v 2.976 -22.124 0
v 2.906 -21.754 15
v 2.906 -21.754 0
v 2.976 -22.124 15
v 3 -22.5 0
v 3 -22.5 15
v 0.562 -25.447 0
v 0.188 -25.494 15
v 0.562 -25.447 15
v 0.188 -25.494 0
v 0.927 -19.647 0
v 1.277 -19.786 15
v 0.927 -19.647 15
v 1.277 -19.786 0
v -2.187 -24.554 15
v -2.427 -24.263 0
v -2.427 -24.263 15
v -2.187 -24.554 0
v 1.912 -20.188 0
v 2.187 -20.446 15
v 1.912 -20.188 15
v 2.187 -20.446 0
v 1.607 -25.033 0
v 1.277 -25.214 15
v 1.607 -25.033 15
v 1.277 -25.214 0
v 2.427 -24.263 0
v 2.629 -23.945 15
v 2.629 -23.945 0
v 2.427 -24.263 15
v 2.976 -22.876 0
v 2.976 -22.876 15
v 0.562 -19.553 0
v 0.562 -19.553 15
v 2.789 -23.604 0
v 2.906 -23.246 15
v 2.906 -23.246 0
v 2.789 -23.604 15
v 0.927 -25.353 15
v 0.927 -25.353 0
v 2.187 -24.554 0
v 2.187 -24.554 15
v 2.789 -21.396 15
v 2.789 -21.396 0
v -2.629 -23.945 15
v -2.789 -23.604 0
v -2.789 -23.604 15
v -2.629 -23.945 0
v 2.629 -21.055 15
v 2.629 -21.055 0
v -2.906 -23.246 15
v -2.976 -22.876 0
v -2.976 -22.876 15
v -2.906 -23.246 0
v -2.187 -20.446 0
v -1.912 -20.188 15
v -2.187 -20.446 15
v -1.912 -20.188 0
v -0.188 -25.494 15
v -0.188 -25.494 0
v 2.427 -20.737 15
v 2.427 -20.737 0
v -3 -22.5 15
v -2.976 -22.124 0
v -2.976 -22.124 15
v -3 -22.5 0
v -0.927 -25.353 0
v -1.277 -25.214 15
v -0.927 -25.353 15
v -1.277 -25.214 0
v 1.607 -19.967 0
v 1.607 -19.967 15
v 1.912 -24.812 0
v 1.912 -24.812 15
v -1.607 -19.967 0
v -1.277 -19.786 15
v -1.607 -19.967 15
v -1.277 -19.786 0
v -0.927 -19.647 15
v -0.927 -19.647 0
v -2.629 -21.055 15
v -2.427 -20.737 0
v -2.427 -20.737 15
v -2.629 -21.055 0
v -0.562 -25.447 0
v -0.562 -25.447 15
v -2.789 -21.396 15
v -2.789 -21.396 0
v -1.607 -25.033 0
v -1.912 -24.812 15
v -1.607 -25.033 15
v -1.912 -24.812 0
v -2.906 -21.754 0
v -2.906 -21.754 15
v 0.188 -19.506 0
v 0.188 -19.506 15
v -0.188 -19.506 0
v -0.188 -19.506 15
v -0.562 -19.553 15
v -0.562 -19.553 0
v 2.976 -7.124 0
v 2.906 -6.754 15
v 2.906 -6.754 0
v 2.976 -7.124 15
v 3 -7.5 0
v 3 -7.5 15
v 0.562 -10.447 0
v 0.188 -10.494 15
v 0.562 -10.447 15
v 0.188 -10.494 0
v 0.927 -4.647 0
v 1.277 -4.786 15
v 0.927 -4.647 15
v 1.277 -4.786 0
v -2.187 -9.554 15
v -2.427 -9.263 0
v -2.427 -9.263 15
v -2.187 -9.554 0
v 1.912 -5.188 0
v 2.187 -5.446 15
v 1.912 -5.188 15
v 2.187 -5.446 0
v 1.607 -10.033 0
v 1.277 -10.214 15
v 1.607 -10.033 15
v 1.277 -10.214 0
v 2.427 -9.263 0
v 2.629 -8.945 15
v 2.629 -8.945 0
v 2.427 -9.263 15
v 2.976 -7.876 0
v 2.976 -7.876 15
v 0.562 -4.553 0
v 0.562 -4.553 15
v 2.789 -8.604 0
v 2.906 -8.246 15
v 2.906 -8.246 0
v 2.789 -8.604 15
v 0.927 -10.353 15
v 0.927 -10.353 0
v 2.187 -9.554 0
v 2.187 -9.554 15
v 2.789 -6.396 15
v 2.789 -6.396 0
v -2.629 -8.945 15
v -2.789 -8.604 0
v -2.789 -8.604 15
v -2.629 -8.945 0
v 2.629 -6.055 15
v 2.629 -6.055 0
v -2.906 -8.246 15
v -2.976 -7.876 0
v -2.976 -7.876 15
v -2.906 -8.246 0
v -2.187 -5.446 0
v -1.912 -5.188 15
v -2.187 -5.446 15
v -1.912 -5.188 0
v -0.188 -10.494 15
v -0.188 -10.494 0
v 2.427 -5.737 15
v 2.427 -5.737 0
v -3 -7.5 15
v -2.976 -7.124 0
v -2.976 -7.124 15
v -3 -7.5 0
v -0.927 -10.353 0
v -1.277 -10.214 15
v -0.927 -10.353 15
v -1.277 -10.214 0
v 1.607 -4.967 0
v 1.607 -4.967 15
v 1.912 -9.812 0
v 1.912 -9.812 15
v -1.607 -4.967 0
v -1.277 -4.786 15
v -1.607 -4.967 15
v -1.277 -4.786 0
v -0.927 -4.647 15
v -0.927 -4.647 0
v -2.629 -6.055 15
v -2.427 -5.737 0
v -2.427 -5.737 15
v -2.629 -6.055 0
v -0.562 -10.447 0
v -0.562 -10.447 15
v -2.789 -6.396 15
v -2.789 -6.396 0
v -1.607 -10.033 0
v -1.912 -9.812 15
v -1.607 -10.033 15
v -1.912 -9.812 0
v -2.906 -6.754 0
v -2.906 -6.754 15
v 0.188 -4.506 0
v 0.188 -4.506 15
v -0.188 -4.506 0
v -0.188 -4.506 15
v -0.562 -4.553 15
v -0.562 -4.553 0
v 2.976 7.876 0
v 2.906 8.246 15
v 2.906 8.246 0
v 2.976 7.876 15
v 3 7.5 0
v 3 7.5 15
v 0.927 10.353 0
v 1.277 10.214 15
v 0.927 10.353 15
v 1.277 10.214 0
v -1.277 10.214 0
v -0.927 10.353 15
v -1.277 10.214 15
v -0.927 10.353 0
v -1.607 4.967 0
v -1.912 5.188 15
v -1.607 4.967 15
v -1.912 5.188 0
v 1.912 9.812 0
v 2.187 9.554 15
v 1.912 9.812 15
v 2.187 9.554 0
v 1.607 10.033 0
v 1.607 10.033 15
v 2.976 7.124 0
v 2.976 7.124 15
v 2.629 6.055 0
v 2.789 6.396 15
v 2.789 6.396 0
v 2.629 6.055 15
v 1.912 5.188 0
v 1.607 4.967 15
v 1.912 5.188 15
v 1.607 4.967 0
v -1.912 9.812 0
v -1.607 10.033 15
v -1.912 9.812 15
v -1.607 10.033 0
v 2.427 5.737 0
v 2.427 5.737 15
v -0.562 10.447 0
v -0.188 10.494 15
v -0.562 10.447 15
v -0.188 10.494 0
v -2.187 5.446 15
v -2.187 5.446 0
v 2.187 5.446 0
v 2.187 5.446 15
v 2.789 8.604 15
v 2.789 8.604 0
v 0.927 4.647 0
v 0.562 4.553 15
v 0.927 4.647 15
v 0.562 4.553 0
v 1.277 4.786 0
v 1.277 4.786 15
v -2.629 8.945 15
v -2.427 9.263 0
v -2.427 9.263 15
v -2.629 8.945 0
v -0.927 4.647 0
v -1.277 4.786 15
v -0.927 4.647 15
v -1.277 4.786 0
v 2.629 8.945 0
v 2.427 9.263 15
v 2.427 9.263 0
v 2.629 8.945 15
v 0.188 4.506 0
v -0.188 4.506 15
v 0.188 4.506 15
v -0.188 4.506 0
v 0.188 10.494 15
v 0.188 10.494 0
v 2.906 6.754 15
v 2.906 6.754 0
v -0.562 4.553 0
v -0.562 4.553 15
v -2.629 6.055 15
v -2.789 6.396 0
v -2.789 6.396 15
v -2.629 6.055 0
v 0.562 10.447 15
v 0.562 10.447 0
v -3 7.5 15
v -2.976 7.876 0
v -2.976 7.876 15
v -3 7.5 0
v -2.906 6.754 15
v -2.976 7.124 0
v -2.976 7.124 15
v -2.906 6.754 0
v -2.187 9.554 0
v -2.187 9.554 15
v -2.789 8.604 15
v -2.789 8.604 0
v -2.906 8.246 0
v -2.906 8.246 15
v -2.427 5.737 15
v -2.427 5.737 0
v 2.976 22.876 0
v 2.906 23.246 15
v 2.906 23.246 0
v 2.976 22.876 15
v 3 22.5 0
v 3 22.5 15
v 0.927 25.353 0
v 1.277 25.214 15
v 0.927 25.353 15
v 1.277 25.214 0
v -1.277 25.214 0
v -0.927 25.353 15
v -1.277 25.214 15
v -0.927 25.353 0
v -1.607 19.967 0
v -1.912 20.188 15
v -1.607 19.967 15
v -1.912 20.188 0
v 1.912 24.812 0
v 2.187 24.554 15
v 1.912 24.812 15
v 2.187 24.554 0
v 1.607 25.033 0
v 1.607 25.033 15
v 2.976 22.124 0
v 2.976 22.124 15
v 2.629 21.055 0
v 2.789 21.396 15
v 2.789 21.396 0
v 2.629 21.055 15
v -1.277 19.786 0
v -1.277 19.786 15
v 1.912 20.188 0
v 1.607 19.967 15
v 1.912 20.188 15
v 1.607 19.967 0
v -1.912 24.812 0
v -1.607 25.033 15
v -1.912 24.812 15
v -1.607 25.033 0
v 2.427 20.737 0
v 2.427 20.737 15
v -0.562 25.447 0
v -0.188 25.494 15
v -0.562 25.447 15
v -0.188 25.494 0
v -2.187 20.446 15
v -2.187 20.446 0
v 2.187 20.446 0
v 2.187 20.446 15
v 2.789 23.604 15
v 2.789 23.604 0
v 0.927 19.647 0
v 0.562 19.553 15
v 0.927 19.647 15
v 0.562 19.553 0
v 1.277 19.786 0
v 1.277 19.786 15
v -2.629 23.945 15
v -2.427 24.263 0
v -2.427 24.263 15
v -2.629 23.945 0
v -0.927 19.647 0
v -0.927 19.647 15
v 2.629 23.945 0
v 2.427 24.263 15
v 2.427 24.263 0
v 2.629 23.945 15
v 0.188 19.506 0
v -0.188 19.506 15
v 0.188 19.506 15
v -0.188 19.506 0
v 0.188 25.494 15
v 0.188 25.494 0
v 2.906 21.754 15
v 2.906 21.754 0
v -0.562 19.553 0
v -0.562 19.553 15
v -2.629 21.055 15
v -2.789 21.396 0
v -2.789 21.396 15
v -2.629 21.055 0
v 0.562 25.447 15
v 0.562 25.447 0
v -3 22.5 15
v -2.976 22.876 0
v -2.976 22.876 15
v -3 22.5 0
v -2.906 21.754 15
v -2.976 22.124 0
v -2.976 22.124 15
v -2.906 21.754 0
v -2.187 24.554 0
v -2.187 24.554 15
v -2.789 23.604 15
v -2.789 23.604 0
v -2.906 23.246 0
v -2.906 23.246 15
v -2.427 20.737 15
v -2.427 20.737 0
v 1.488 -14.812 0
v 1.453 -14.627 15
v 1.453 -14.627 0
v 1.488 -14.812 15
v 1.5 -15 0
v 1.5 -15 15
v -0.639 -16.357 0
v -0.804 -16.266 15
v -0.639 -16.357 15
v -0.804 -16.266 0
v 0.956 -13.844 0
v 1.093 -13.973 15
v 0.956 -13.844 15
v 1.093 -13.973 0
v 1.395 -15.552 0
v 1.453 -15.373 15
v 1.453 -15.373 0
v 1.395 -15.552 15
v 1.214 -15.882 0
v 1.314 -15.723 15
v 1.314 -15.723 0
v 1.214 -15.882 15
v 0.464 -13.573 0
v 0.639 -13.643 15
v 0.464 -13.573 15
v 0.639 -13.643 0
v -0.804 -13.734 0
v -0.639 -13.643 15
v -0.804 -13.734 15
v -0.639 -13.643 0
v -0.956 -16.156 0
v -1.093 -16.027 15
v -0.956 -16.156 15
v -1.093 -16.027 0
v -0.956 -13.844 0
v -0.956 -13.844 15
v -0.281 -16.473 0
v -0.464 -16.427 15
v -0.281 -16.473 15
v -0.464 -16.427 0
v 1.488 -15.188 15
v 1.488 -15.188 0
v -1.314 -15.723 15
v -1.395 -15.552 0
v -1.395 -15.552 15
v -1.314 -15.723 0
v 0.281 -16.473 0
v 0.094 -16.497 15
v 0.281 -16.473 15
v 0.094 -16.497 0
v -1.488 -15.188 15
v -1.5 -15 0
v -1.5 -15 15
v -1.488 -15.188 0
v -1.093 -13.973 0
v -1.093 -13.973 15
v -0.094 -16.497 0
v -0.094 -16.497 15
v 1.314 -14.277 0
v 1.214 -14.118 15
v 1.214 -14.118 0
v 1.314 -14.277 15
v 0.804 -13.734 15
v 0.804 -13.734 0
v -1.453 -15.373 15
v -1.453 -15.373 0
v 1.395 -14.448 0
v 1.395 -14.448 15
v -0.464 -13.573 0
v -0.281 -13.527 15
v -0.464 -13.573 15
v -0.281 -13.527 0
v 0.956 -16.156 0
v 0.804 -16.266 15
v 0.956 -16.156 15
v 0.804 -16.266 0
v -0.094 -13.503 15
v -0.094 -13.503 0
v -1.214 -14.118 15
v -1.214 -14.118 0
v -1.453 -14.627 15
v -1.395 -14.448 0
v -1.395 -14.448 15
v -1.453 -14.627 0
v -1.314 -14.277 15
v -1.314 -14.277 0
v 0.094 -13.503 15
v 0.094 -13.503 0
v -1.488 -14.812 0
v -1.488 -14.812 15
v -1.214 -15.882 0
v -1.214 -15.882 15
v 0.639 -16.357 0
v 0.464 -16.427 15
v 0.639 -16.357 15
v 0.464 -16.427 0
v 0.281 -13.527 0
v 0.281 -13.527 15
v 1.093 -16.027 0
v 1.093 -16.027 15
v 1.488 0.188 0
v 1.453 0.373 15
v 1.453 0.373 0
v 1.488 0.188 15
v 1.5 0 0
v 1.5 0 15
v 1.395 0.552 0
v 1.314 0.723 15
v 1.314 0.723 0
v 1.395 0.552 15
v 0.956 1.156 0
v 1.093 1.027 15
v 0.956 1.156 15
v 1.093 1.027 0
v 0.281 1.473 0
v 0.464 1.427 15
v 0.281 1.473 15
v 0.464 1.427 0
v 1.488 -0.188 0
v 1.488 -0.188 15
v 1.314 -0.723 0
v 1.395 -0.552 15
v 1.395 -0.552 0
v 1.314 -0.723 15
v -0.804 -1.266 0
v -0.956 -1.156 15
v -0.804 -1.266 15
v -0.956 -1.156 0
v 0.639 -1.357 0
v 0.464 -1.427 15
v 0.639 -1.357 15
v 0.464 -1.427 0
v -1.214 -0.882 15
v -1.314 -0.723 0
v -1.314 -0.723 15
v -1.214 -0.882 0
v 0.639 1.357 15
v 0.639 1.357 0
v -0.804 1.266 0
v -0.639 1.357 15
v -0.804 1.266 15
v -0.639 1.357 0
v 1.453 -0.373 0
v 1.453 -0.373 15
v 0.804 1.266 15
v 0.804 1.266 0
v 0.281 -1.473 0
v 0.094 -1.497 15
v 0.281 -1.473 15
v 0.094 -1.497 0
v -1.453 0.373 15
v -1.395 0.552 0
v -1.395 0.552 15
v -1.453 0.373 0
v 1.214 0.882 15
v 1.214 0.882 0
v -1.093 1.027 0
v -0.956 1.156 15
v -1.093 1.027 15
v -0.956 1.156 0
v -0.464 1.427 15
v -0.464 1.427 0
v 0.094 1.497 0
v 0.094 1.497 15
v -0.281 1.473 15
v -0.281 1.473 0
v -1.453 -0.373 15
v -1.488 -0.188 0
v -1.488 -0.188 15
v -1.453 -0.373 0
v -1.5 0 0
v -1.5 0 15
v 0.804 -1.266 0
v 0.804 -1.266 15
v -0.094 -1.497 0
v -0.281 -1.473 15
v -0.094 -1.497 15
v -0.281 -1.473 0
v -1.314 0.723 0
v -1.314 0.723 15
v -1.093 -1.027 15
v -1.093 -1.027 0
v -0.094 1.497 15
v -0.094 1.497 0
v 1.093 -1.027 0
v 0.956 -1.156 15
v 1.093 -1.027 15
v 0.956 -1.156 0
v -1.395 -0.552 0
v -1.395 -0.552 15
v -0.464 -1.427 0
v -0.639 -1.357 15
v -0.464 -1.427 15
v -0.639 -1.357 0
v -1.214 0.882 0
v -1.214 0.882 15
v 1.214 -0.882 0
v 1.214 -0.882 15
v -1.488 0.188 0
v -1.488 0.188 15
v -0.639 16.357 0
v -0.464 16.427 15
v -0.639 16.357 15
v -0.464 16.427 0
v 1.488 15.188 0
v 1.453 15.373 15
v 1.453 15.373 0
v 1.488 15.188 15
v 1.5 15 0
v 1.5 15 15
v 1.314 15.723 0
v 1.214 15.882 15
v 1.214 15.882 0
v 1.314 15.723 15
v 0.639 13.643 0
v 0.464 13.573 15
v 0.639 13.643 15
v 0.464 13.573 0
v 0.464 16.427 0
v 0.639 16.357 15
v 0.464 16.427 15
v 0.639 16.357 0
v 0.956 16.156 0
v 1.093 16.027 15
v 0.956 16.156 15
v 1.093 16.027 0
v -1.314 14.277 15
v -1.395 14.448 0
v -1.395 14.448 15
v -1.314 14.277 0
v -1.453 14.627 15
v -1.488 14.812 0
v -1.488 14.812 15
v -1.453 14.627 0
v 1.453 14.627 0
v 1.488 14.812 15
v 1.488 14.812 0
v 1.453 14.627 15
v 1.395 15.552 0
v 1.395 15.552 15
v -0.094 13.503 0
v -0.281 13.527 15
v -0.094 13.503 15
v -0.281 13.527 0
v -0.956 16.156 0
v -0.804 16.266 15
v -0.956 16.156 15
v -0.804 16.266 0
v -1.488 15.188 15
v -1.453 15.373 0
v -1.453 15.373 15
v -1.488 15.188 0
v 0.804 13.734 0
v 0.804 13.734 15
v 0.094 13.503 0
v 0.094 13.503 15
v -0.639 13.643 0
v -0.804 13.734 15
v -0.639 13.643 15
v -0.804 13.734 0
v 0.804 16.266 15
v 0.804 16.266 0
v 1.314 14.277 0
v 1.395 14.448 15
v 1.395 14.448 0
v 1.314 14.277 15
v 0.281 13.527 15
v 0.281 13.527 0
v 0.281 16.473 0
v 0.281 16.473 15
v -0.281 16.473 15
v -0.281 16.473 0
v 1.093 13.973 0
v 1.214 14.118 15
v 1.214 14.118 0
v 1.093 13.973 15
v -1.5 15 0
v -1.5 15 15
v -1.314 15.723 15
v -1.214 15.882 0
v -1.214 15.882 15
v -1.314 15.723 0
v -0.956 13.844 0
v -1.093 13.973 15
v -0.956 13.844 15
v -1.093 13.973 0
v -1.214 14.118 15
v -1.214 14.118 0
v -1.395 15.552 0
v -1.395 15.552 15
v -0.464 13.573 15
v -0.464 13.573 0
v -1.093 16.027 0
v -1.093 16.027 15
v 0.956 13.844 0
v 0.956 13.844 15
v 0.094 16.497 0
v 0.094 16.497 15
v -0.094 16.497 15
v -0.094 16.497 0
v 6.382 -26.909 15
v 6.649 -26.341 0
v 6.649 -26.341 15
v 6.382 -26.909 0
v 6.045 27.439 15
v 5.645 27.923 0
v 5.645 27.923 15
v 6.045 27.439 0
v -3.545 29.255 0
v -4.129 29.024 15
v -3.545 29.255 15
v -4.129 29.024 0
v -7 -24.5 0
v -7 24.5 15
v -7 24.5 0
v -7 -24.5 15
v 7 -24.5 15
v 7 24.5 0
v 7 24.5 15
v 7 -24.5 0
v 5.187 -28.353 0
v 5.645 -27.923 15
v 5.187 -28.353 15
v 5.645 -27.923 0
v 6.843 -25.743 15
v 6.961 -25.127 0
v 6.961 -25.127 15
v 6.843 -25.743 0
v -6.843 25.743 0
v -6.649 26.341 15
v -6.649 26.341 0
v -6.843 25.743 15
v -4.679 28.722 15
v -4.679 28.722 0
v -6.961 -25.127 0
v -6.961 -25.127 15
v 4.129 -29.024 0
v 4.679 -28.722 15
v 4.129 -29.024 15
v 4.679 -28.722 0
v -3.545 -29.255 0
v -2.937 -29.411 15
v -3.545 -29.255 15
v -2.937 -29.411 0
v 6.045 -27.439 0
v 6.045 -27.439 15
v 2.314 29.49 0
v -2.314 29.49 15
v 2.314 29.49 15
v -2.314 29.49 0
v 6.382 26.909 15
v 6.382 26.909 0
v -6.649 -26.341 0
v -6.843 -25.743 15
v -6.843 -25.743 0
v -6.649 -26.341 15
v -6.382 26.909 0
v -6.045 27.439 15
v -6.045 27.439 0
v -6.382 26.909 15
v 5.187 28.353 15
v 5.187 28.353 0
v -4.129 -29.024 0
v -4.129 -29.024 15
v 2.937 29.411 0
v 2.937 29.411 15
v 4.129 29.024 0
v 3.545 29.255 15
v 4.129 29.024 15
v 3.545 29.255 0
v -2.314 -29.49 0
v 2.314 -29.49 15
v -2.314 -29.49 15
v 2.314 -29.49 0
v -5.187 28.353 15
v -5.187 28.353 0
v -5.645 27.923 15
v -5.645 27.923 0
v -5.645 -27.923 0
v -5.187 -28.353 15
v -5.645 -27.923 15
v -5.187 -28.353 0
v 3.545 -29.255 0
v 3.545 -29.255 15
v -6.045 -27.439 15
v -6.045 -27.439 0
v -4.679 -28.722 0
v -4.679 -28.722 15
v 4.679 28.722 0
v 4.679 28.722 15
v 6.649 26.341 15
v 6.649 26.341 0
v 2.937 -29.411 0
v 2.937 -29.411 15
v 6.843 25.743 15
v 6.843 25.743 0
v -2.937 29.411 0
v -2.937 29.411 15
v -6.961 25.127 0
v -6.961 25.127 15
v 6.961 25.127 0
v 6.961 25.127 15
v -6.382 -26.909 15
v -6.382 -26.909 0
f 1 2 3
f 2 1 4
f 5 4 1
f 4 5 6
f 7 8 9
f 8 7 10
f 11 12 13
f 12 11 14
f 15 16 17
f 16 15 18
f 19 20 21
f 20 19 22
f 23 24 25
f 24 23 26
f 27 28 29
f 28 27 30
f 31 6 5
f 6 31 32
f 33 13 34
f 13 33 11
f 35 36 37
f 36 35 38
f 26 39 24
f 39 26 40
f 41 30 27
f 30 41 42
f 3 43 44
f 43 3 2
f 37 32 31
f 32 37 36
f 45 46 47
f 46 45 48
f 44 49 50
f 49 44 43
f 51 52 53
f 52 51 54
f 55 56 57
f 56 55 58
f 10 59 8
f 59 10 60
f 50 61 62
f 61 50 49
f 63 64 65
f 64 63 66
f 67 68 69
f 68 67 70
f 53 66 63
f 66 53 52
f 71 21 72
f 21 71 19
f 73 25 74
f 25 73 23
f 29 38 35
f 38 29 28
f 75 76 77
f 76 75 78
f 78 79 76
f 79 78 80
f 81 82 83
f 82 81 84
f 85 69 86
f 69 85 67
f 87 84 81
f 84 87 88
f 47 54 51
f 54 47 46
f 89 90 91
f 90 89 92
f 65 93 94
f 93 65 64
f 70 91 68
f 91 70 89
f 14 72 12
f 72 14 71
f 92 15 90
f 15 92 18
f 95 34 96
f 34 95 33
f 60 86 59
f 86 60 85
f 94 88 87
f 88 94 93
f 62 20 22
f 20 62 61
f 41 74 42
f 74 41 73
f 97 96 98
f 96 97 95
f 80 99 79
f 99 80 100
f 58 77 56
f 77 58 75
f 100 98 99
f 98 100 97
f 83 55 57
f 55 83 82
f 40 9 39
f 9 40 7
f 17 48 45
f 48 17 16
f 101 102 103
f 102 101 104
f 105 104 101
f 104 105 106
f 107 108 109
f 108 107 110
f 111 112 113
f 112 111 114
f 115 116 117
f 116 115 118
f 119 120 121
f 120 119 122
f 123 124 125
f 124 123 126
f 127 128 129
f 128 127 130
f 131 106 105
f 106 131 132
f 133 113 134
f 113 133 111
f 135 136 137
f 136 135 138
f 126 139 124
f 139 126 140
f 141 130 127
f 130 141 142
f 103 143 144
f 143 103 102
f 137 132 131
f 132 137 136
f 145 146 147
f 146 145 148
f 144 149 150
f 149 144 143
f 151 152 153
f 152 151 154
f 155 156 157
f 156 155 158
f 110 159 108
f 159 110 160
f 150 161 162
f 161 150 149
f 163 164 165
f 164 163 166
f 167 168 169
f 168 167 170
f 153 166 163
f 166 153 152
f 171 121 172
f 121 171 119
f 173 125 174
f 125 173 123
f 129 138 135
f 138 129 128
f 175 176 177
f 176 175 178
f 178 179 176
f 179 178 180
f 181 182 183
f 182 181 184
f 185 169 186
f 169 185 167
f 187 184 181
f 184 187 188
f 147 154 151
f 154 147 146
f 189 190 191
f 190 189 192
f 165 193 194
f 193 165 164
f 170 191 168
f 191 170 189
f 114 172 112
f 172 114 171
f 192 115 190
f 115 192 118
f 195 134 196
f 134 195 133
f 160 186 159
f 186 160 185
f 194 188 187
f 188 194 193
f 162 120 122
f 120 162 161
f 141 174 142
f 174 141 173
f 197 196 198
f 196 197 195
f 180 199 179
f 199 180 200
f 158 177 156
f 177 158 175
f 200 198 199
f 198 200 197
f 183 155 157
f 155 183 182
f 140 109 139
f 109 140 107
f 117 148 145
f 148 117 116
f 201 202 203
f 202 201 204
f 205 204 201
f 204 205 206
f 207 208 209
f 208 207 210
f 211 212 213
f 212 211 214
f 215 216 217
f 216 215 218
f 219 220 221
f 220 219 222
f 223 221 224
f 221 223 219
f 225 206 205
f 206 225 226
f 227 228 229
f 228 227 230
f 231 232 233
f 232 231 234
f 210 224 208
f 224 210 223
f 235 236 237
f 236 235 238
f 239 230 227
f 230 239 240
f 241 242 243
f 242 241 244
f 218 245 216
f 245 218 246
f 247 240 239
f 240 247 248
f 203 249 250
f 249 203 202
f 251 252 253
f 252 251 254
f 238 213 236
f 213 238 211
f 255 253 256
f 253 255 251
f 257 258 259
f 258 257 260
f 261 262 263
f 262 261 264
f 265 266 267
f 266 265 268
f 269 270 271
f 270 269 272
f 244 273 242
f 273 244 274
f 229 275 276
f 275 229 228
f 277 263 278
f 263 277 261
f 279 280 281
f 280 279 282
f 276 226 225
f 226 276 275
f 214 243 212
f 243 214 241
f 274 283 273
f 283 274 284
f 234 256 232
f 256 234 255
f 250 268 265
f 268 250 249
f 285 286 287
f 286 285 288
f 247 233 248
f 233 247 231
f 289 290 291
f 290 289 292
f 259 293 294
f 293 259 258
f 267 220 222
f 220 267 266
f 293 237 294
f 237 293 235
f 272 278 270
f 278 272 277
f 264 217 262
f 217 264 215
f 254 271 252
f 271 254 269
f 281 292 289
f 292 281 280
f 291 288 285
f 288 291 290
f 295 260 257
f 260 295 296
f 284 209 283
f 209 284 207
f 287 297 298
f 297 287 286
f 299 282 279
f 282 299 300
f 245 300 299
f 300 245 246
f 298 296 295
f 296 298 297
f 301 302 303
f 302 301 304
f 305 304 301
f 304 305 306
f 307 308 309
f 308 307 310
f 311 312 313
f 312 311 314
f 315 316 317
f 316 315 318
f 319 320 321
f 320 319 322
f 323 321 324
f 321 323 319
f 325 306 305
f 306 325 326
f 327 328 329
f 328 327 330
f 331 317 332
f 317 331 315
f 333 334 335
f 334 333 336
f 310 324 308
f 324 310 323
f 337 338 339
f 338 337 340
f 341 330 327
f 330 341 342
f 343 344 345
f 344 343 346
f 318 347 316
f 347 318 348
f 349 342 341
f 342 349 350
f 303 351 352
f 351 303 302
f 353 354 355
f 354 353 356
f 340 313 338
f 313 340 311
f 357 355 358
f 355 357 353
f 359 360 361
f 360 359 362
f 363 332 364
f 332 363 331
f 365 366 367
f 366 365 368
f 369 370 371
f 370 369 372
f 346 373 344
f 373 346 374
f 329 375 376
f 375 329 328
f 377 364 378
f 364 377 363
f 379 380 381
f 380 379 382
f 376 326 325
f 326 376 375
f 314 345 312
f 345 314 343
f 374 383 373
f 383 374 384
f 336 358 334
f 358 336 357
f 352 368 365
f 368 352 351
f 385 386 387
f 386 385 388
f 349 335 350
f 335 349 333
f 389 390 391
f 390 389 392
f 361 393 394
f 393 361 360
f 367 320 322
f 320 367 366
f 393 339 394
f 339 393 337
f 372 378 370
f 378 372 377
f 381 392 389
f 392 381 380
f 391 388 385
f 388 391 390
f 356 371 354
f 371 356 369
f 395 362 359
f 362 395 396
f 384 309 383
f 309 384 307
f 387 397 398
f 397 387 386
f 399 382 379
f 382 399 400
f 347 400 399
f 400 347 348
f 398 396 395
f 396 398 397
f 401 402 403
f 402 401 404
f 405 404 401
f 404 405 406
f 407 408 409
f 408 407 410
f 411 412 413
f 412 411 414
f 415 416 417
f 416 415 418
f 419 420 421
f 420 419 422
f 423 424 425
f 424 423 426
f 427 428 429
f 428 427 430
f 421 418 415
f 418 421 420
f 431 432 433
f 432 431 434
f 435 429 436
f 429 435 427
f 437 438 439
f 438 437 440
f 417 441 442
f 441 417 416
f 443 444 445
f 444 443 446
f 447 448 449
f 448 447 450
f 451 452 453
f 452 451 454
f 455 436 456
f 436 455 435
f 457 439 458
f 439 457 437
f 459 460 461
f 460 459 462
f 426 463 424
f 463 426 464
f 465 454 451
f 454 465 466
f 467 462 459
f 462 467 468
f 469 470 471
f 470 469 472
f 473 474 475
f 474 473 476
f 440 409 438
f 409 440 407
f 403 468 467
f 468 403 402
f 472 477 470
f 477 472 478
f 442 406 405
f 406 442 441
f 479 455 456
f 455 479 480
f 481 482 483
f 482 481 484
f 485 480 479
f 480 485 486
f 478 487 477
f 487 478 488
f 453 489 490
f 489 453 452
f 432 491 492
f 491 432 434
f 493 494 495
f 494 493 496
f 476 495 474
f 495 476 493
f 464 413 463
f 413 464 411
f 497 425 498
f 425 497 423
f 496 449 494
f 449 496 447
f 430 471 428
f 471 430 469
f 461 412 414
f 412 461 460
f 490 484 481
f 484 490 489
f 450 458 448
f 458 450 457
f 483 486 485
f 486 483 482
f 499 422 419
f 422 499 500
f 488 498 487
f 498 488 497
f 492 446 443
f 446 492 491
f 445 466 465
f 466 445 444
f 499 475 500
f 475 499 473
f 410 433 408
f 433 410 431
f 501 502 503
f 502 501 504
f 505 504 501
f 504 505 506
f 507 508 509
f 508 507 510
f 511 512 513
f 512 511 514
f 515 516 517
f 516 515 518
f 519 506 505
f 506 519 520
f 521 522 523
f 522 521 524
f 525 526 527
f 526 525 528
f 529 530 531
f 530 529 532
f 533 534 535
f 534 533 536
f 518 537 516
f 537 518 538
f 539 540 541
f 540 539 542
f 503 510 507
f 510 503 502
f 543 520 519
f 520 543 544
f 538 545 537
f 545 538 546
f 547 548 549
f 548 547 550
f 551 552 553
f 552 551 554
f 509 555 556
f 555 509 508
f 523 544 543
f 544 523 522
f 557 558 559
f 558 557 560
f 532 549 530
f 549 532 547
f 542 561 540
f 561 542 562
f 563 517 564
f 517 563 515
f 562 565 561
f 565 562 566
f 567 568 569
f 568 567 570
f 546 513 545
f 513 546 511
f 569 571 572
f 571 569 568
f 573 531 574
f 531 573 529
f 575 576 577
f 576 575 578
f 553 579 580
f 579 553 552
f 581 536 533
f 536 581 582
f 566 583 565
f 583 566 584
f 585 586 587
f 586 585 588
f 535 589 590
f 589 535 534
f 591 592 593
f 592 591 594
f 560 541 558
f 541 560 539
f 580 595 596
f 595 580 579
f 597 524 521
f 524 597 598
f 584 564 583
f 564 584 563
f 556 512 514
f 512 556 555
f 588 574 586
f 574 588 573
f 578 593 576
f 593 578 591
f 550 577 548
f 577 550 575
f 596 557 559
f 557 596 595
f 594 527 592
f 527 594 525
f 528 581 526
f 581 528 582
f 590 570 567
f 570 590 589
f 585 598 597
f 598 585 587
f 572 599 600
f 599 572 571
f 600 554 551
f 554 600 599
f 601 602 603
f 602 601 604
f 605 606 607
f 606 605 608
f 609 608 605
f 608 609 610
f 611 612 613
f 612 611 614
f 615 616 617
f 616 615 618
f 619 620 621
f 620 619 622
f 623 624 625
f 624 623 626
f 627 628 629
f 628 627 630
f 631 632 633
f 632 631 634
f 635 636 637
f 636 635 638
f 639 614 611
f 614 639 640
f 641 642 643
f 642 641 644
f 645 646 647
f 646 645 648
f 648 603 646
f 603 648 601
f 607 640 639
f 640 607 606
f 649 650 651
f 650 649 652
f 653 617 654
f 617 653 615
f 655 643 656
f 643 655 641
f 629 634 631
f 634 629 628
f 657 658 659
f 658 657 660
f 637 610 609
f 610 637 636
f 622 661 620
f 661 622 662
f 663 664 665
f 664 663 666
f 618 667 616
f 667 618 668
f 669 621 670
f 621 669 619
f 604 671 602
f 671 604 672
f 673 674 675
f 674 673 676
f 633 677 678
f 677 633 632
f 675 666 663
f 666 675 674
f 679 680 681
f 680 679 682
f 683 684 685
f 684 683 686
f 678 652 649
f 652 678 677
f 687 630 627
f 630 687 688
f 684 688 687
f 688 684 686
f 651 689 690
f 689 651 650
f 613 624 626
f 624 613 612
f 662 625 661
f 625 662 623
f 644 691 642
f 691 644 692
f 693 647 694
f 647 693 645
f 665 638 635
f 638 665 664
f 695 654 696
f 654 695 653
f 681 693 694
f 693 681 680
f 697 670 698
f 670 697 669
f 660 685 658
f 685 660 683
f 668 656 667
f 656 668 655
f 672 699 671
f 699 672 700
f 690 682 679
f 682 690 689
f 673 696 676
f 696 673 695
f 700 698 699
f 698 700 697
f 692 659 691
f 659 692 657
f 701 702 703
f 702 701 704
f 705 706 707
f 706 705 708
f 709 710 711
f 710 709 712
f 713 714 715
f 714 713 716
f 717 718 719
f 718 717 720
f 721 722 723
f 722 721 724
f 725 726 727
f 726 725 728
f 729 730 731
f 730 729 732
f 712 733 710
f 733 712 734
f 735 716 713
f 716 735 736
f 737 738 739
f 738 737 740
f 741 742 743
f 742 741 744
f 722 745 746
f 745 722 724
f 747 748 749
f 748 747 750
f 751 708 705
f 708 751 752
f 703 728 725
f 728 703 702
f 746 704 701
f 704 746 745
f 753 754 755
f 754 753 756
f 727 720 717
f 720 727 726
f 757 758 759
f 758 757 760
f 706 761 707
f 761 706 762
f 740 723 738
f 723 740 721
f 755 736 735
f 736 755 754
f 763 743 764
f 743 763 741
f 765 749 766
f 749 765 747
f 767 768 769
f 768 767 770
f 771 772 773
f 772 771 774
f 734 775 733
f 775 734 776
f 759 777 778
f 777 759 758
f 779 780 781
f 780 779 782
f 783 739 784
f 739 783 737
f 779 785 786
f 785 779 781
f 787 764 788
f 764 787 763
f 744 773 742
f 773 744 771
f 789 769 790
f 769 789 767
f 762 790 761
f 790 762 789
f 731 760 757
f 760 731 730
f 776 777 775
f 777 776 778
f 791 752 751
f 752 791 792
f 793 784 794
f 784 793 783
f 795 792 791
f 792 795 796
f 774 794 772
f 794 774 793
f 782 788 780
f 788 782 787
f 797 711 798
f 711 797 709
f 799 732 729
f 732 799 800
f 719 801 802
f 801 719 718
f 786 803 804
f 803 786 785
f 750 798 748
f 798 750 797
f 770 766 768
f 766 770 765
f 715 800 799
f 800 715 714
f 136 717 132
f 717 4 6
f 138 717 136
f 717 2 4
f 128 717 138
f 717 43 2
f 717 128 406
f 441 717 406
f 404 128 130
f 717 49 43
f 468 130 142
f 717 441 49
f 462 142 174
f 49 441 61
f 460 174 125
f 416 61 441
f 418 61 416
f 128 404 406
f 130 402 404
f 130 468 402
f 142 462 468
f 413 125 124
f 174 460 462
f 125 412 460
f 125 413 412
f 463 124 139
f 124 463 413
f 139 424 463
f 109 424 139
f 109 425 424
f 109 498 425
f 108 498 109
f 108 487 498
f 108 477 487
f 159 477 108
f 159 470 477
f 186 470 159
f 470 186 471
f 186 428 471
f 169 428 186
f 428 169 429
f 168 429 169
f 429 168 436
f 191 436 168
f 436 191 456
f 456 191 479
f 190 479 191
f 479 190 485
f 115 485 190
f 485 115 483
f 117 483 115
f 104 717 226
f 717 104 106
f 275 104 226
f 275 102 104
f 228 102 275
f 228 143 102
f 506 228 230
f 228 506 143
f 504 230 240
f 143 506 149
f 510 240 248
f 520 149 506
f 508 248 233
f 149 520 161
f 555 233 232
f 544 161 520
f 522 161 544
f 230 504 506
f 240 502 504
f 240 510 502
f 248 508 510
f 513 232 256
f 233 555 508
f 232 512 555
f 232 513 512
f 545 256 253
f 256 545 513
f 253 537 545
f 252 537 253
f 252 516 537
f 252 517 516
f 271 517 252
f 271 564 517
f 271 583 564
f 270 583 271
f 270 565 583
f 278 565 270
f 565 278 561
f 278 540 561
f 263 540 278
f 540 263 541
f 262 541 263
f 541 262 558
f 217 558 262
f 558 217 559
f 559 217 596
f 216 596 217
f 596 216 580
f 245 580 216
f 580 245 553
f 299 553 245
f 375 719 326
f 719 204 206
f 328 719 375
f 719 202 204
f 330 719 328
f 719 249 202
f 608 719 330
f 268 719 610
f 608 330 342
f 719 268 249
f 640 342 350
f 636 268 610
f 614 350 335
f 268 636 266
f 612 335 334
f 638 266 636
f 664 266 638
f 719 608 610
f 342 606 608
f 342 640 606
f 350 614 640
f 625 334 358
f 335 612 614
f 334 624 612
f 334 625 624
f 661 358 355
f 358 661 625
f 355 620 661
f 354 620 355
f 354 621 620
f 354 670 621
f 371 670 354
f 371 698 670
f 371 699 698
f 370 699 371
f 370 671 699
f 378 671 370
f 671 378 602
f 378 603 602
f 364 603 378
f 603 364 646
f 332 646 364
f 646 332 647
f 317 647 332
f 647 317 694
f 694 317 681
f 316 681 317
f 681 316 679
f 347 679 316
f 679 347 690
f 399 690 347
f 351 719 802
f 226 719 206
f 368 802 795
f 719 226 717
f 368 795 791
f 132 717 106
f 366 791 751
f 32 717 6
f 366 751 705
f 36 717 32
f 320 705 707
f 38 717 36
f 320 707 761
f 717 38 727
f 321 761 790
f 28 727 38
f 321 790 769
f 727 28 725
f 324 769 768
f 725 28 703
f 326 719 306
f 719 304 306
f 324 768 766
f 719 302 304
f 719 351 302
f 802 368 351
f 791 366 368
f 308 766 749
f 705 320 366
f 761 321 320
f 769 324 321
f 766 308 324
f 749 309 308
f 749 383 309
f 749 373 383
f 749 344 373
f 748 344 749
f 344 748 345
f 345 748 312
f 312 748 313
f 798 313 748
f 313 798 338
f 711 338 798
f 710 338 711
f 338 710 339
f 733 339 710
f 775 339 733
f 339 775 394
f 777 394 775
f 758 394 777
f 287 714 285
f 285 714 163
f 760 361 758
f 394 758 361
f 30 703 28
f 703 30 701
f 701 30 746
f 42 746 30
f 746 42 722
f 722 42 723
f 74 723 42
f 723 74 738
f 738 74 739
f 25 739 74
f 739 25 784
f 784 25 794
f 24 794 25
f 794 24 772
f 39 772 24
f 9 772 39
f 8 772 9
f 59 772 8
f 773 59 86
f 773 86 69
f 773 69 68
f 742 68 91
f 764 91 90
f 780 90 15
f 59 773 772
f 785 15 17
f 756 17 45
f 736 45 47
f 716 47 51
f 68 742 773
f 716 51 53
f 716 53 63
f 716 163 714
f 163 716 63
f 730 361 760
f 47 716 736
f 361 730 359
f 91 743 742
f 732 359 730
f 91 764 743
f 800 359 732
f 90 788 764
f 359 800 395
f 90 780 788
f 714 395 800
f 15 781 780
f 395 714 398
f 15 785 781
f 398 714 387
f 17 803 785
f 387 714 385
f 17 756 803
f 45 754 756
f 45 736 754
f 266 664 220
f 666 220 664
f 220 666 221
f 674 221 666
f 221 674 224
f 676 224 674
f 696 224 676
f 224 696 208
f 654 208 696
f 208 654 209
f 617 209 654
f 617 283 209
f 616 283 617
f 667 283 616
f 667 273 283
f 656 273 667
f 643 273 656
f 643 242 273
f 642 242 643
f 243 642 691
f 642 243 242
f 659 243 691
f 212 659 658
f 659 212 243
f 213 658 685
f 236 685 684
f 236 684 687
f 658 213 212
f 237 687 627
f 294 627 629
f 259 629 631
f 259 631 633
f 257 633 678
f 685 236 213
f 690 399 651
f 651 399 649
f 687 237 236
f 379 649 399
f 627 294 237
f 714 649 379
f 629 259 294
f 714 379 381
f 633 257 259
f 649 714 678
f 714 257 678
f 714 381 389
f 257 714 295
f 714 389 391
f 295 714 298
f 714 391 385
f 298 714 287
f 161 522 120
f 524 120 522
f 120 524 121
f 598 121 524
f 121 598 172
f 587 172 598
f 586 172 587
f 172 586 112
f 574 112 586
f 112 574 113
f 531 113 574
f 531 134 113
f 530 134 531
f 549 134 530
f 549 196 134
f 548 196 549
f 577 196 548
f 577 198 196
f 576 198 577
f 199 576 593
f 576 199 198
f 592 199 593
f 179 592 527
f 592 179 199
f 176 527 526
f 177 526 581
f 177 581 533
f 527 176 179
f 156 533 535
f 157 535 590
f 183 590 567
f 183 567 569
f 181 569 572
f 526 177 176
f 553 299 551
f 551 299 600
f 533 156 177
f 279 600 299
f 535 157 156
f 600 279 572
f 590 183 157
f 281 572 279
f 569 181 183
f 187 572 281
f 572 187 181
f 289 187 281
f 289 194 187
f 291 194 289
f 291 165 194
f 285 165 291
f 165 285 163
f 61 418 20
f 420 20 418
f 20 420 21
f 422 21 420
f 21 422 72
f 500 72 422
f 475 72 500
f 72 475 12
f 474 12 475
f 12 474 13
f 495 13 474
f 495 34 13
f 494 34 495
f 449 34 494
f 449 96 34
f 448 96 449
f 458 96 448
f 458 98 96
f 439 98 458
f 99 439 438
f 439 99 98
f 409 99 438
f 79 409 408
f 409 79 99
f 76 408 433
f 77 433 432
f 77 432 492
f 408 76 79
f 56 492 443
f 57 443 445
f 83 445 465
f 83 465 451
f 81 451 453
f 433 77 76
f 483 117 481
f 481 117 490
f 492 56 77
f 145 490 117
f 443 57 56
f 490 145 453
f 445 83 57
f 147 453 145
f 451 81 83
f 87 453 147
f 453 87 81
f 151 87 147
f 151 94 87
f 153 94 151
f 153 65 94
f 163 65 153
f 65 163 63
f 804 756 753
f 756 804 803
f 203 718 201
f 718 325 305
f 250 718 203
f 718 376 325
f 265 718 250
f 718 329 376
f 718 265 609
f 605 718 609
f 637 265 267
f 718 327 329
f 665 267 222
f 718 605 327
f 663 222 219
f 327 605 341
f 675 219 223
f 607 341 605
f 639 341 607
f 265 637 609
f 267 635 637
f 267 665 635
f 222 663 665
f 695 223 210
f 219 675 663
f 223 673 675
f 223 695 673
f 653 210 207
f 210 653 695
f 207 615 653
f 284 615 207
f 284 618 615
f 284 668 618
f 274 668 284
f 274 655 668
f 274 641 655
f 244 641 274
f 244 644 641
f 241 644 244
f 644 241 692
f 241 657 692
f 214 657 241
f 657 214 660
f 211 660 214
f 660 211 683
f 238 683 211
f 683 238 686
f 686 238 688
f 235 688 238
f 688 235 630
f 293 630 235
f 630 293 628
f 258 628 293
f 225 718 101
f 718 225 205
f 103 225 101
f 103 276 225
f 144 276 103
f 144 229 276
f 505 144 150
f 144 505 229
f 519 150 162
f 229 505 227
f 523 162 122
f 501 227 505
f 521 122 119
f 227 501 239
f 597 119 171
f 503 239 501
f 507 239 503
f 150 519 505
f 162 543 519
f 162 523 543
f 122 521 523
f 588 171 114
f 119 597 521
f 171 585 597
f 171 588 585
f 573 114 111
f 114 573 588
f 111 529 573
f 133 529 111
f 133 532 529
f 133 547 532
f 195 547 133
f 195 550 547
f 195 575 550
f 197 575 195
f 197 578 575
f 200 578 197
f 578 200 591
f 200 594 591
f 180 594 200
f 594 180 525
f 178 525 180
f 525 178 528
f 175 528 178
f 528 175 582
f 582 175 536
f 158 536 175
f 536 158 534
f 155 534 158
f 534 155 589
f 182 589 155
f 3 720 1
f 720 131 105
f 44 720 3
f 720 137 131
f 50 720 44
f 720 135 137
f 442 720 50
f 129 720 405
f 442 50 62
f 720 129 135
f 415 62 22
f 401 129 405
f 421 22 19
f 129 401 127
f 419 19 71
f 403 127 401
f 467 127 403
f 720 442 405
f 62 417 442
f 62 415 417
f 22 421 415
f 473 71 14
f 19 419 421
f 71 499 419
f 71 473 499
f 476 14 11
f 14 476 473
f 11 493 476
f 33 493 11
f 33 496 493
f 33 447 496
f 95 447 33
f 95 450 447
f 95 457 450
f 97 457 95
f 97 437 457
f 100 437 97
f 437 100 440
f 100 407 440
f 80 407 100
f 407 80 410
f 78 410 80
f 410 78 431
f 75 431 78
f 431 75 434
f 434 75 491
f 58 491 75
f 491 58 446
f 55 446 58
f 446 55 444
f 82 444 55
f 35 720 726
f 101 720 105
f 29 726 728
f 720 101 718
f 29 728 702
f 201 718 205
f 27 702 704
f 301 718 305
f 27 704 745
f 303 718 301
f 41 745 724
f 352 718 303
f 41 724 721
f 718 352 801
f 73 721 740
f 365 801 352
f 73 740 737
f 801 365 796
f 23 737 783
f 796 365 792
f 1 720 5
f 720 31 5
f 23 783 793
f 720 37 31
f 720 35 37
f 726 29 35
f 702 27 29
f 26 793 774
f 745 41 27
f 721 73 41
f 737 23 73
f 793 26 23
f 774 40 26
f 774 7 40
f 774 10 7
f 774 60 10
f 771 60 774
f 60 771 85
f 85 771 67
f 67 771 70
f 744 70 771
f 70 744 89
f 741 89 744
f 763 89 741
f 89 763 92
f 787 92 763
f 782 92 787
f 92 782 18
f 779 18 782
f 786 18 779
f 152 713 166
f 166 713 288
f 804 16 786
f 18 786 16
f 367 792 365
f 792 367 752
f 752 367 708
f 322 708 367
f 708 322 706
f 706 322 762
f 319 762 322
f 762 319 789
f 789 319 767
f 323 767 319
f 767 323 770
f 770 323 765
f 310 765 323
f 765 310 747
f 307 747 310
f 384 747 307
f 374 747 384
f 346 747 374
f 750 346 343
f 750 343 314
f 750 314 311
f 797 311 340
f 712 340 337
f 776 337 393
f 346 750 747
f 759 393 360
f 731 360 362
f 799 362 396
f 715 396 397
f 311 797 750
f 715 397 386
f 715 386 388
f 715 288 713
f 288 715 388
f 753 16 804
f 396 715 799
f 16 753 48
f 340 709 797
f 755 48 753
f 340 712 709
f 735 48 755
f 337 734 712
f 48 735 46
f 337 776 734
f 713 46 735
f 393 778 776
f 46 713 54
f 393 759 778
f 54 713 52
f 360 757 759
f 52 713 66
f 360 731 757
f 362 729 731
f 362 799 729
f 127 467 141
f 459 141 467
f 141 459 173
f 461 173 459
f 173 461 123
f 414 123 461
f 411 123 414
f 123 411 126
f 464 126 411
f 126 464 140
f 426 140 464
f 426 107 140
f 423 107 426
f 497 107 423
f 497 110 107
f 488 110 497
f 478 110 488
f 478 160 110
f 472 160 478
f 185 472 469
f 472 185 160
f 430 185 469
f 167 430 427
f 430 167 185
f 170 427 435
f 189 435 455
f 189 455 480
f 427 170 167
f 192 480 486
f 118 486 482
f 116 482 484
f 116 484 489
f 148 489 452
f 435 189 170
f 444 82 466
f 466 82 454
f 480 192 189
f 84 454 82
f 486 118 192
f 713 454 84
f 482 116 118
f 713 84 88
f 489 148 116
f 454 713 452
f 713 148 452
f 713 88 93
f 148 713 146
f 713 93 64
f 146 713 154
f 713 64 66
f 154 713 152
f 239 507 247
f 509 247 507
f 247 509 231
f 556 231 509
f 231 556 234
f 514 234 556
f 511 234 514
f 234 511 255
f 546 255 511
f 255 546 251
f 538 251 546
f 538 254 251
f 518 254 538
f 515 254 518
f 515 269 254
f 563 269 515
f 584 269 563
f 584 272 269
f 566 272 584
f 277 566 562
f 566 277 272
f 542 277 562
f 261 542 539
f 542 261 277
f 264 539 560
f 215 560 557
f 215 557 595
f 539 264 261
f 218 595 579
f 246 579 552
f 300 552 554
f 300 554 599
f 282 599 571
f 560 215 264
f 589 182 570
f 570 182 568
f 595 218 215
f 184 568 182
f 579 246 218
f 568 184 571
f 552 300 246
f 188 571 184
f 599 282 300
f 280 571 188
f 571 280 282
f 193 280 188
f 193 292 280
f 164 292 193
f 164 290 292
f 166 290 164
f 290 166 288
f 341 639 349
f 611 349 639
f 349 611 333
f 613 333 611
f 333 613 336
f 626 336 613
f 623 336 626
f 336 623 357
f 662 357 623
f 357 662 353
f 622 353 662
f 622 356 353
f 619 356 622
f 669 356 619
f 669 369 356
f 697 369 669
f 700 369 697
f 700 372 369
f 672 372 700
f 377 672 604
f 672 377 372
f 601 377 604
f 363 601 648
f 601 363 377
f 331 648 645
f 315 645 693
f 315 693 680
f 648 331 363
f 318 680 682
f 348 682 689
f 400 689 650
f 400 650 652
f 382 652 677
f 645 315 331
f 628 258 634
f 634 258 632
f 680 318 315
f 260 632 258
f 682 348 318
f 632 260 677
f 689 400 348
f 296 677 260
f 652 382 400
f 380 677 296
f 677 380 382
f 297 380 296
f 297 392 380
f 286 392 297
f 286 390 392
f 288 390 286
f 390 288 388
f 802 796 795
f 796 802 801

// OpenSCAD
$fn = 50;

difference() {
	union() {
		hull() {
			translate(v = [-2.0, 24.5, 0]) {
				cylinder(h = 15, r = 5);
			}
			translate(v = [2.0, 24.5, 0]) {
				cylinder(h = 15, r = 5);
			}
			translate(v = [-2.0, -24.5, 0]) {
				cylinder(h = 15, r = 5);
			}
			translate(v = [2.0, -24.5, 0]) {
				cylinder(h = 15, r = 5);
			}
		}
	}
	union() {
		translate(v = [0.0, -22.5, 0]) {
			translate(v = [0, 0, -100]) {
				cylinder(h = 200, r = 3.0);
			}
		}
		translate(v = [0.0, -7.5, 0]) {
			translate(v = [0, 0, -100]) {
				cylinder(h = 200, r = 3.0);
			}
		}
		translate(v = [0.0, 7.5, 0]) {
			translate(v = [0, 0, -100]) {
				cylinder(h = 200, r = 3.0);
			}
		}
		translate(v = [0.0, 22.5, 0]) {
			translate(v = [0, 0, -100]) {
				cylinder(h = 200, r = 3.0);
			}
		}
		translate(v = [0.0, -22.5, 0]) {
			translate(v = [0, 0, -100]) {
				cylinder(h = 200, r = 1.5);
			}
		}
		translate(v = [0.0, -15.0, 0]) {
			translate(v = [0, 0, -100]) {
				cylinder(h = 200, r = 1.5);
			}
		}
		translate(v = [0.0, -7.5, 0]) {
			translate(v = [0, 0, -100]) {
				cylinder(h = 200, r = 1.5);
			}
		}
		translate(v = [0, 0, -100]) {
			cylinder(h = 200, r = 1.5);
		}
		translate(v = [0.0, 7.5, 0]) {
			translate(v = [0, 0, -100]) {
				cylinder(h = 200, r = 1.5);
			}
		}
		translate(v = [0.0, 15.0, 0]) {
			translate(v = [0, 0, -100]) {
				cylinder(h = 200, r = 1.5);
			}
		}
		translate(v = [0.0, 22.5, 0]) {
			translate(v = [0, 0, -100]) {
				cylinder(h = 200, r = 1.5);
			}
		}
	}
}
